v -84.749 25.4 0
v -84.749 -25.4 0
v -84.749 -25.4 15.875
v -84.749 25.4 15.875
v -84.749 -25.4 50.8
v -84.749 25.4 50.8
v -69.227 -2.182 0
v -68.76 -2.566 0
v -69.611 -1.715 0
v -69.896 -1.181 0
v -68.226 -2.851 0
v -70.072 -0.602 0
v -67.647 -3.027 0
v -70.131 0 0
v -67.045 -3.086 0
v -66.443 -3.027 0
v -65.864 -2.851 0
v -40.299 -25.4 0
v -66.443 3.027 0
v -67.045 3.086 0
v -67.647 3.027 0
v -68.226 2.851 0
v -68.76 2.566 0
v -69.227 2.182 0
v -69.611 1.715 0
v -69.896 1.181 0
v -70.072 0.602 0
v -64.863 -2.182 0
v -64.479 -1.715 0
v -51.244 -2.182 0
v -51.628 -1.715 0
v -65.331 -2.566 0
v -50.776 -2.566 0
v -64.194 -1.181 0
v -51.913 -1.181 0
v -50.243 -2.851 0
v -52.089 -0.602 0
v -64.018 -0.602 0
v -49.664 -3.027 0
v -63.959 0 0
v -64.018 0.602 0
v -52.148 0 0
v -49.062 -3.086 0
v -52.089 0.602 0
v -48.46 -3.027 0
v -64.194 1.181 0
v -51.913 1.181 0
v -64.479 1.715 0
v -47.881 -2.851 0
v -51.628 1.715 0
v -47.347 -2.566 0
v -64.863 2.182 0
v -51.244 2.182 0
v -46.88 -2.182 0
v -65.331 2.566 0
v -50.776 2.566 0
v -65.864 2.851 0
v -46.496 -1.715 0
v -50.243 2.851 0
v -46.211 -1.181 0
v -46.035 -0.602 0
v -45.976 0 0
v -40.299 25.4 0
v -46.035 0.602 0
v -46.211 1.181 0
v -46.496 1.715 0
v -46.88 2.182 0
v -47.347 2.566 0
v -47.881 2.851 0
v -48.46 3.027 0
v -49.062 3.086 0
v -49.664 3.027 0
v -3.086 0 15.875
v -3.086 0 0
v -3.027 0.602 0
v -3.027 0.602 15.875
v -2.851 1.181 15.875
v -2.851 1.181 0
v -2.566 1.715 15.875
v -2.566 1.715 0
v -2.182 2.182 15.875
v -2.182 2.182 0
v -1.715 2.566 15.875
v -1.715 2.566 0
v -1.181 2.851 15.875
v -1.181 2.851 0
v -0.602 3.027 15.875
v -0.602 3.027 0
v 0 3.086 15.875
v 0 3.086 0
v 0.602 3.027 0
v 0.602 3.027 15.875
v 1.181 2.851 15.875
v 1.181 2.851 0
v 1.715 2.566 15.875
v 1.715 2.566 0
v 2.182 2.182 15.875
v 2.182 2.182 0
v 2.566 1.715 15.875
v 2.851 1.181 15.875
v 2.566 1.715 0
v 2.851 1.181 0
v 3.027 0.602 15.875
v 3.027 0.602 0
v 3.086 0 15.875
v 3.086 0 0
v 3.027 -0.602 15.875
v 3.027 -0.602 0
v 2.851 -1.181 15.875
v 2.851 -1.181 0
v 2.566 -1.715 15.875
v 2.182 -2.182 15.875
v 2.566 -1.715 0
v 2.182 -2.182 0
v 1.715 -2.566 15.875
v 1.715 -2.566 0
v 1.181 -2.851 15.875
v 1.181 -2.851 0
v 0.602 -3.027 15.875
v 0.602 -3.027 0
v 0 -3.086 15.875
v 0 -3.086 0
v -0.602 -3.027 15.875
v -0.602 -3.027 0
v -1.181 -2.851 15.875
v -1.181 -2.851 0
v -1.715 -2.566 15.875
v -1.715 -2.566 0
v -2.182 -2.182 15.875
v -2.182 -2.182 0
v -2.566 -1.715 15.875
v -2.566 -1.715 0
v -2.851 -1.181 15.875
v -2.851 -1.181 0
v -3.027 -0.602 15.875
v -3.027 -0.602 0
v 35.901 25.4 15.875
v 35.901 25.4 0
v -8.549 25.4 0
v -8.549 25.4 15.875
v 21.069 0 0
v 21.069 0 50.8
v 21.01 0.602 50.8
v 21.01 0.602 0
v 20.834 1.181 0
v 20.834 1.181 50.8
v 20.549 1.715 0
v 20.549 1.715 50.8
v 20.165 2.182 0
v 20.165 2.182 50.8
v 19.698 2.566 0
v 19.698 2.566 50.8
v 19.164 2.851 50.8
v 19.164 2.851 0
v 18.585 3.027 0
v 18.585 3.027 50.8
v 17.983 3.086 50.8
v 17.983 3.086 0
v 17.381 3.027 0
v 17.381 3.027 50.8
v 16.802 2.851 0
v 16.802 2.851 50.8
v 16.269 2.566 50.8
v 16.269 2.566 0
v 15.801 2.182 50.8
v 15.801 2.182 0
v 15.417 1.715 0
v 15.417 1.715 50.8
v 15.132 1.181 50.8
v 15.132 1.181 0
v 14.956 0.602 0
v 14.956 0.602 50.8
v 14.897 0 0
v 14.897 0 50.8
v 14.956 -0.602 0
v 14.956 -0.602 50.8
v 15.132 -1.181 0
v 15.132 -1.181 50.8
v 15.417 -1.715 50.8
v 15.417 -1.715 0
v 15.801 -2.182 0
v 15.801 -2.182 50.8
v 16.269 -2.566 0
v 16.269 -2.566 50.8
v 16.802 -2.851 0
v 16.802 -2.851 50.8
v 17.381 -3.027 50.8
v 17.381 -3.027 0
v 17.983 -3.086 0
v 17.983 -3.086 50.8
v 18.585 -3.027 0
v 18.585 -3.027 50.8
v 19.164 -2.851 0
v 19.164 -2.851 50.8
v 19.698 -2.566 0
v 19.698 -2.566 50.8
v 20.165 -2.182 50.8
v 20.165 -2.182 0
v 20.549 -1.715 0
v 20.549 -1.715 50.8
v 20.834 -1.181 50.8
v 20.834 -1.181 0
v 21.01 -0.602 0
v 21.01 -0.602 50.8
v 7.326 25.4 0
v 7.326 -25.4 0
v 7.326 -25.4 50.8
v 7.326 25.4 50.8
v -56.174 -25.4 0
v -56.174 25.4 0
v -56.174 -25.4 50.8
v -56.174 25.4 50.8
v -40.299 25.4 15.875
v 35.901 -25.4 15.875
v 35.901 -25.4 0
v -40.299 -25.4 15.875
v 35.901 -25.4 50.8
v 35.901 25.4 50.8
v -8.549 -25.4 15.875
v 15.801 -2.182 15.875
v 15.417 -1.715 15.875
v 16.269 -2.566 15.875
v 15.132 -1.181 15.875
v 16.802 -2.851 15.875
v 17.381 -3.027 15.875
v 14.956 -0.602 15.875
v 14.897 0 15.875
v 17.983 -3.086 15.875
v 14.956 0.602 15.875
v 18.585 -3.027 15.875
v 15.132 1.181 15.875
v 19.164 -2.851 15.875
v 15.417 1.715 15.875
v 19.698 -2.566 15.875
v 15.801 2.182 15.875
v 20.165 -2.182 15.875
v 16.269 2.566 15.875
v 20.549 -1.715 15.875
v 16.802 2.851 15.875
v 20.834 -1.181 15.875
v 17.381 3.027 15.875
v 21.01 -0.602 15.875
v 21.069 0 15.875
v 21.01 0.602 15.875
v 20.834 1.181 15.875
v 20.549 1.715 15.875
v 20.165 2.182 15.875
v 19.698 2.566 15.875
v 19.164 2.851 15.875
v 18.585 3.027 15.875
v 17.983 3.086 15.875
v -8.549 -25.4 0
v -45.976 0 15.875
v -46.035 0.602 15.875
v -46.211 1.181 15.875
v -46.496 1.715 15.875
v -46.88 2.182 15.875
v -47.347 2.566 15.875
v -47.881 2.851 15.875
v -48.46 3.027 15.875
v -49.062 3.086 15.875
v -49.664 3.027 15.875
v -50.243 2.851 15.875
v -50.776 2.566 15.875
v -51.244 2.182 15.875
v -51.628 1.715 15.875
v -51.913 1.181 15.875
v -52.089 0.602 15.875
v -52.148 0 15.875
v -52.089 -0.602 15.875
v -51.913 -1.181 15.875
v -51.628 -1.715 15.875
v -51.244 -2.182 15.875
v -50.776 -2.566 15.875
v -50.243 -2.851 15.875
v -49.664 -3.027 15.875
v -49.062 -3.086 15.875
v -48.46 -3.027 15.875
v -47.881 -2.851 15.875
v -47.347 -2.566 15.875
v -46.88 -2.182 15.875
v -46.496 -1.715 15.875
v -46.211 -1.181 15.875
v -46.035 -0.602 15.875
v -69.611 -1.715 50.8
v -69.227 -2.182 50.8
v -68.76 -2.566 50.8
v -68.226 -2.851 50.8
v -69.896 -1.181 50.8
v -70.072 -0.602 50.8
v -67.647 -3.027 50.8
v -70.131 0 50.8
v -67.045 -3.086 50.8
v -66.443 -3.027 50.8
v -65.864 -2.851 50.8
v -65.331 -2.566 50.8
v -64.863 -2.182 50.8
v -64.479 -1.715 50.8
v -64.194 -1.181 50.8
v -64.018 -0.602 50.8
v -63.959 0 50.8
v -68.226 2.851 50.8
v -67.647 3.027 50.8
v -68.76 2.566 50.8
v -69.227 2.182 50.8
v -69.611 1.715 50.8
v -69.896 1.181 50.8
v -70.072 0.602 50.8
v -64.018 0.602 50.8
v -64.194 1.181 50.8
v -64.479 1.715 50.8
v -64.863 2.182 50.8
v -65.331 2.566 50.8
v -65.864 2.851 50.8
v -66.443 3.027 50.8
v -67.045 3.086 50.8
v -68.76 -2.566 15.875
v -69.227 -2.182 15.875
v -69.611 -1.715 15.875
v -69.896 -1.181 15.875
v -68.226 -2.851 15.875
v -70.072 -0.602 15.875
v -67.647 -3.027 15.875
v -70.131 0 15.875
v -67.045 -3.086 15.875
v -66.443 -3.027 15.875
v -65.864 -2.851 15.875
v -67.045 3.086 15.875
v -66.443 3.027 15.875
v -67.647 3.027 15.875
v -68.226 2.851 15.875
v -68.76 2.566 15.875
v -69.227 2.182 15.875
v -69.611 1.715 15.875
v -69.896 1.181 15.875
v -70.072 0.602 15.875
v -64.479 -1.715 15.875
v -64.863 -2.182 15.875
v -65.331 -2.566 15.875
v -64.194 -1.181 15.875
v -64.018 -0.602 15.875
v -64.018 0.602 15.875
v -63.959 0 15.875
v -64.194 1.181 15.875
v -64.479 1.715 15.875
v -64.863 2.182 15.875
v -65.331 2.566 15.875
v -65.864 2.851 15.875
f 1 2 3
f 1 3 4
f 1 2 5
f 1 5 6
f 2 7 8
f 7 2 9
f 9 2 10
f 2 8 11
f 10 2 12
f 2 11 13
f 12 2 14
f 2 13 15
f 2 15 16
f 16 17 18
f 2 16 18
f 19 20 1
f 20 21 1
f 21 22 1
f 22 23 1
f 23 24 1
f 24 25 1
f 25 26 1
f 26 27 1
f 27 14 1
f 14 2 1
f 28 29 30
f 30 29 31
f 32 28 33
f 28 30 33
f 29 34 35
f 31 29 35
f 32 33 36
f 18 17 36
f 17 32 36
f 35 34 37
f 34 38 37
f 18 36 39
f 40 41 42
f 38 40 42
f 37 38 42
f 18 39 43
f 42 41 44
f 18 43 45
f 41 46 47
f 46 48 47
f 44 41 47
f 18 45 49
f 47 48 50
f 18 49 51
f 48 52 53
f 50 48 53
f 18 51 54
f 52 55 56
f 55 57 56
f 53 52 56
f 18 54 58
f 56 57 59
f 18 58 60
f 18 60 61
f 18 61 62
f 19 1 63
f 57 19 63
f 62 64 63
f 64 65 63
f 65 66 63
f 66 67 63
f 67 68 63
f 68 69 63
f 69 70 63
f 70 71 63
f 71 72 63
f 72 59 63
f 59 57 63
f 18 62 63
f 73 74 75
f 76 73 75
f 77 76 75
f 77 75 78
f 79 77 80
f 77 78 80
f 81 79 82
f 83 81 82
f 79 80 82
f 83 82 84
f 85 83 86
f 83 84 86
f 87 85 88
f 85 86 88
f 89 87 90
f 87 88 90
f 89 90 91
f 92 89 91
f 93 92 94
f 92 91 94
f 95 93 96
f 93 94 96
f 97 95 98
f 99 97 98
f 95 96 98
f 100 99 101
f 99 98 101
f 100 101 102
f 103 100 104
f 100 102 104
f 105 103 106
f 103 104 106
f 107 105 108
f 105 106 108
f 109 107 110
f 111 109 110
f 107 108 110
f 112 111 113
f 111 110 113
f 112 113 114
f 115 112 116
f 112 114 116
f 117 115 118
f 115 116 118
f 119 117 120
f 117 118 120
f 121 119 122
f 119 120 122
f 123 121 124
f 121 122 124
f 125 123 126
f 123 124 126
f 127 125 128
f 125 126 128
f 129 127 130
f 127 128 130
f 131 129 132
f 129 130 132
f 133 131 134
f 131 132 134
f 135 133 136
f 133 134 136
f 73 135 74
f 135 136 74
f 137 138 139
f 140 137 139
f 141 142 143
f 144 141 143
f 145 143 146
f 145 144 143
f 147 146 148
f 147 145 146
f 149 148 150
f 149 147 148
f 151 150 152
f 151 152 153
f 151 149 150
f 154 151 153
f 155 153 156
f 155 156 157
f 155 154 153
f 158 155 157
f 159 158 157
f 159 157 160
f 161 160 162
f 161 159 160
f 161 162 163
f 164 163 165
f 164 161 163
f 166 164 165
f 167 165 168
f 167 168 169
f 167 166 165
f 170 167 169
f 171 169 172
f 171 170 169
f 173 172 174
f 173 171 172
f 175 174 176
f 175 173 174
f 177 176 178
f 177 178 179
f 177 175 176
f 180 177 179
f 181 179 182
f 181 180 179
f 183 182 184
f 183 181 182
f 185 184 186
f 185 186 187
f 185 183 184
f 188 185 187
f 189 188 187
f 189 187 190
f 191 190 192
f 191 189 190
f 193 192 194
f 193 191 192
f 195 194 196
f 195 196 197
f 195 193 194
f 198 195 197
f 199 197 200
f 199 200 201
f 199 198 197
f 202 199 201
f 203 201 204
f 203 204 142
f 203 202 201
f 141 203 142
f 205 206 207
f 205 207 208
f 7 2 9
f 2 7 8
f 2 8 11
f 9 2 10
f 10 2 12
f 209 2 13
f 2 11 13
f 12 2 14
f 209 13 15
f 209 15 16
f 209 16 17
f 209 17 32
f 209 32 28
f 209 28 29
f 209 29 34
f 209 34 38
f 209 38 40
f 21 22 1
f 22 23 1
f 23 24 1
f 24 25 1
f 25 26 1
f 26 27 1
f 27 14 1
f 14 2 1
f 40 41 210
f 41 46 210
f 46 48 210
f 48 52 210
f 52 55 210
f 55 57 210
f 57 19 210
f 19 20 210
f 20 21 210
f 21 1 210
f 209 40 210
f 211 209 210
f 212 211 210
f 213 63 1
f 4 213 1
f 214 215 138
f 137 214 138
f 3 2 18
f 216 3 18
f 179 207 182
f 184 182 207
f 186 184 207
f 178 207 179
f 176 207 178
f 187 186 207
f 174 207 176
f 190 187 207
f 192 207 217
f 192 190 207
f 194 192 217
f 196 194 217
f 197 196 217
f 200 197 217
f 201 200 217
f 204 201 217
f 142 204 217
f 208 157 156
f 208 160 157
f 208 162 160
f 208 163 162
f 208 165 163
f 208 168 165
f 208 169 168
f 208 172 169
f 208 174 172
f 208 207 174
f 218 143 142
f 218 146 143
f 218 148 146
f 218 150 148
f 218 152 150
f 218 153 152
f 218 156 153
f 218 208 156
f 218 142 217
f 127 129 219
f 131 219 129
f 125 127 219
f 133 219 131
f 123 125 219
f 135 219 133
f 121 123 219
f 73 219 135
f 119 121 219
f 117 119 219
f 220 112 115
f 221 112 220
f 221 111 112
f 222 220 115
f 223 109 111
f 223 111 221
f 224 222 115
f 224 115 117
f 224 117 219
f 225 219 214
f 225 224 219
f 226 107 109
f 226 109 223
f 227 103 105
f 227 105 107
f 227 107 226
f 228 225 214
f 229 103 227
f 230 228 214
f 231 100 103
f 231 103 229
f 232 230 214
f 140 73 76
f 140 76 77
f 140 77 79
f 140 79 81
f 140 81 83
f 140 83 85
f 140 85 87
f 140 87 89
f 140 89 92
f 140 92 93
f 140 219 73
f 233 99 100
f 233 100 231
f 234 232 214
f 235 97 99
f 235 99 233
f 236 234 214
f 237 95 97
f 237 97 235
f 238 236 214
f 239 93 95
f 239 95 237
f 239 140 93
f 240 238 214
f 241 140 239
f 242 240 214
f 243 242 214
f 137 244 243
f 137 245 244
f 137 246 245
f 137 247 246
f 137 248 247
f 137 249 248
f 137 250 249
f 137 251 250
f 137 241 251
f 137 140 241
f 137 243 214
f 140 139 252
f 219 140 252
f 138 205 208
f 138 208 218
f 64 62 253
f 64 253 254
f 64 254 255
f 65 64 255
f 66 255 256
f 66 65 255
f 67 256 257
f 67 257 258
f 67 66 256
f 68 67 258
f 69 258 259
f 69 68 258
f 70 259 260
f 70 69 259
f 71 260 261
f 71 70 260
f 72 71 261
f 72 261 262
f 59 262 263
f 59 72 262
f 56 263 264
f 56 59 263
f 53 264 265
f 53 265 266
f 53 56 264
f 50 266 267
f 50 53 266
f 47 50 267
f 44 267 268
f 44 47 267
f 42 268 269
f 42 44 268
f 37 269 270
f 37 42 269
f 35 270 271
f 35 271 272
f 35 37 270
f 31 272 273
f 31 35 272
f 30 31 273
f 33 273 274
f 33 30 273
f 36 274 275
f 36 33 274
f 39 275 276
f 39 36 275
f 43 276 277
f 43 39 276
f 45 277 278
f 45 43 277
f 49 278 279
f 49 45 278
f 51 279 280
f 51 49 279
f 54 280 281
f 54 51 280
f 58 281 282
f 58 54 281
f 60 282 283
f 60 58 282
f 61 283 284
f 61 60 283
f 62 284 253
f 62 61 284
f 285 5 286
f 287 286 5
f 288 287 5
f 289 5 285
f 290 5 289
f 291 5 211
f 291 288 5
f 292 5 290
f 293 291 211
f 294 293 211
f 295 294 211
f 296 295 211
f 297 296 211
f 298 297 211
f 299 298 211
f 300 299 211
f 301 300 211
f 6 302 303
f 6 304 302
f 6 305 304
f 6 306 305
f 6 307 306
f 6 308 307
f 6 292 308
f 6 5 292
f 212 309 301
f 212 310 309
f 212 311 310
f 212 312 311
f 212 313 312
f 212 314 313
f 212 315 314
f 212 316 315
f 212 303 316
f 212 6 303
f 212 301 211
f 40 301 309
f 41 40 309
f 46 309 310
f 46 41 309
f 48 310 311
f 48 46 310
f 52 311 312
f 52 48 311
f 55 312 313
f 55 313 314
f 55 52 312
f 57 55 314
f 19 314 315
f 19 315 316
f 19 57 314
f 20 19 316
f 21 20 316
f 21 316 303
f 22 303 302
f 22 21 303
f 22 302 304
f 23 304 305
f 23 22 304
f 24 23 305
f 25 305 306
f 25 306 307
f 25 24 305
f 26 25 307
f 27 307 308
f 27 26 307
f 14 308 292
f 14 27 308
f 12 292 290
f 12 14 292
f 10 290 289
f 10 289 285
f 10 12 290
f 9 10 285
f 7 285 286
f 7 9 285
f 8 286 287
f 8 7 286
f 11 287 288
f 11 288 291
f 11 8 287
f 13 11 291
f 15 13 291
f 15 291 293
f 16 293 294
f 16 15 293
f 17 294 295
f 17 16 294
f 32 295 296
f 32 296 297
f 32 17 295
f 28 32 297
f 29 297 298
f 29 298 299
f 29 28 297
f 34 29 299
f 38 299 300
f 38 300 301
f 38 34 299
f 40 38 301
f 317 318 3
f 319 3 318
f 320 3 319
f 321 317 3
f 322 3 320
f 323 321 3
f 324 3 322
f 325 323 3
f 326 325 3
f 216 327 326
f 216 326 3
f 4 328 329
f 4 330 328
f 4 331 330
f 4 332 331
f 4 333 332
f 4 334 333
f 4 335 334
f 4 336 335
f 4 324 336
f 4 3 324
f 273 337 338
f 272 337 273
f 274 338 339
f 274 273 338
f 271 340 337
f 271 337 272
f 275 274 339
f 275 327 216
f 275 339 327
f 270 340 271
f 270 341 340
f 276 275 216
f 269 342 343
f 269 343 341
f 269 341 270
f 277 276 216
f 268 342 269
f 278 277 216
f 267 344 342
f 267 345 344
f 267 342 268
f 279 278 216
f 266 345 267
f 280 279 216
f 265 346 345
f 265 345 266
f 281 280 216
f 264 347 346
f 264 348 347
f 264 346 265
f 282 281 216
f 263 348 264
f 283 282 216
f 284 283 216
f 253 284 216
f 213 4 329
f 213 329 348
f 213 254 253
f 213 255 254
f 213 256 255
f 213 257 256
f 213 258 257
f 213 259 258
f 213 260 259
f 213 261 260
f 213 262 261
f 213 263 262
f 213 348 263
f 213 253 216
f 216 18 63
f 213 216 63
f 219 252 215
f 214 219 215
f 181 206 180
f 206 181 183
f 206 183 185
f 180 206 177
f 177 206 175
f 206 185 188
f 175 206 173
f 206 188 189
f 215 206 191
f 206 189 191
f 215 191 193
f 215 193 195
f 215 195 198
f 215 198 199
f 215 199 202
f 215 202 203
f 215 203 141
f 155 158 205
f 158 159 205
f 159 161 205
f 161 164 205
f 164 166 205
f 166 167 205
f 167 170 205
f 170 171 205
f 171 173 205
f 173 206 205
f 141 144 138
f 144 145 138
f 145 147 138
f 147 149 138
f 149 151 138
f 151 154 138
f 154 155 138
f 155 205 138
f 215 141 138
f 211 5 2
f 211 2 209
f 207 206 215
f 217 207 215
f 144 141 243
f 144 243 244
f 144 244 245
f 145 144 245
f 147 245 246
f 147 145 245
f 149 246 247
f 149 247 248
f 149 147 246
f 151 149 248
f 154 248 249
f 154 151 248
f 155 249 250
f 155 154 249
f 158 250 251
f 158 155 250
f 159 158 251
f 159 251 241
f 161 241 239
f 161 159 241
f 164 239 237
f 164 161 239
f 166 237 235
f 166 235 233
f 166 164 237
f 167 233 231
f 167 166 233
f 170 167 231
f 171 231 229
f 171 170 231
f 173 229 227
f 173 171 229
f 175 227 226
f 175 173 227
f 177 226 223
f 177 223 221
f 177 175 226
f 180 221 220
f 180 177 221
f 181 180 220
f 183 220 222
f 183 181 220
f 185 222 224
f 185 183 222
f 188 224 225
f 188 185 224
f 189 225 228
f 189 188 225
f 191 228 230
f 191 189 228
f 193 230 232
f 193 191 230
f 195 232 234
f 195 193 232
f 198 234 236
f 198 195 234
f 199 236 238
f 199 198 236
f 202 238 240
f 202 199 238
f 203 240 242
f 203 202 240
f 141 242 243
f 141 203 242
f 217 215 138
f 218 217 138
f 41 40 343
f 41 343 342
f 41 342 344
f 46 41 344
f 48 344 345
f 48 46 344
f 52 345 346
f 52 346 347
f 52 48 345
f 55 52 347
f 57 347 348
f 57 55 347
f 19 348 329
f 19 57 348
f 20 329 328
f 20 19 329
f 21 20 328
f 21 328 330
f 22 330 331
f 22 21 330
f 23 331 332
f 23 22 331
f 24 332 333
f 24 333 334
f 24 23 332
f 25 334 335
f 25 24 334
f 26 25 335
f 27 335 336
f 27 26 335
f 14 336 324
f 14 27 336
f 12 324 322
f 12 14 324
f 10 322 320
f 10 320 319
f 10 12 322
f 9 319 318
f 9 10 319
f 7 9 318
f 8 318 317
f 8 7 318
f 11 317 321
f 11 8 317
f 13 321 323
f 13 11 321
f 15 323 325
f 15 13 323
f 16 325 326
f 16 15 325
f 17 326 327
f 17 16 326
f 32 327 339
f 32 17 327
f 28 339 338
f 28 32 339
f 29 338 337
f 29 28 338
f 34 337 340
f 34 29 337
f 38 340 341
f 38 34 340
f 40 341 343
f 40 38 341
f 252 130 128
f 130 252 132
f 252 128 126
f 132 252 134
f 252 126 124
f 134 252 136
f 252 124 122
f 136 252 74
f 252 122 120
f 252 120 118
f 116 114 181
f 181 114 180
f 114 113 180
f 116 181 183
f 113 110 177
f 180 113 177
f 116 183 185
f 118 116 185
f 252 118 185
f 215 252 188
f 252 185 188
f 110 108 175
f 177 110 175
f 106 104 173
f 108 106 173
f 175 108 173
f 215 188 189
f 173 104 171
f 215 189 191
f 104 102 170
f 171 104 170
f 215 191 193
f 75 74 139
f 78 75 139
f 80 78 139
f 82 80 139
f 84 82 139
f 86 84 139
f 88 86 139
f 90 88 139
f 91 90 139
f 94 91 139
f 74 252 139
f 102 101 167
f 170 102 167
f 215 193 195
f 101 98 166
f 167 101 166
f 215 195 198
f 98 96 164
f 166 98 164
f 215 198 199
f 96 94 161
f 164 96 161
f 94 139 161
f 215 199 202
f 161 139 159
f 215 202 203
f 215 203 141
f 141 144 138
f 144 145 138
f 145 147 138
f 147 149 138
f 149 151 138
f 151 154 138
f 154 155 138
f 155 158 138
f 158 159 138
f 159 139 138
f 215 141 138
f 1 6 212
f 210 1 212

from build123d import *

# Parameters (mm, degrees)
F0_W     = 28.575
F0_H     = 50.8
F0_R     = 3.0861
F1_DEPTH = 50.8
F2_DEPTH = 15.875


with BuildPart() as f1:
    # F0 (on Top) → F1 (new body)
    with BuildSketch(Plane.XY):
        with Locations((-70.4613795156, 0)):
            Rectangle(F0_W, F0_H)
        with Locations((-67.0450795156, 0)):
            Circle(F0_R, mode=Mode.SUBTRACT)
    extrude(amount=F1_DEPTH)


with BuildPart() as f1b:
    # F0 (on Top) → F1, piece 2 (new body)
    with BuildSketch(Plane.XY):
        with Locations((21.6136204844, 0)):
            Rectangle(F0_W, F0_H)
        with Locations((17.9832, 0)):
            Circle(F0_R, mode=Mode.SUBTRACT)
    extrude(amount=F1_DEPTH)


with BuildPart() as f2:
    # F0 (on Top) → F2 (new body)
    with BuildSketch(Plane.XY):
        Polygon((-40.2988795156, -25.4), (-40.2988795156, 0), (-40.2988795156, 25.4), (-56.1738795156, 25.4), (-56.1738795156, -25.4), align=None)
        with Locations((-49.0618795156, 0)):
            Circle(F0_R, mode=Mode.SUBTRACT)
        with Locations((-70.4613795156, 0)):
            Rectangle(F0_W, F0_H)
        with Locations((-67.0450795156, 0)):
            Circle(F0_R, mode=Mode.SUBTRACT)
    extrude(amount=F2_DEPTH)


with BuildPart() as f2b:
    # F0 (on Top) → F2, piece 2 (new body)
    with BuildSketch(Plane.XY):
        Polygon((-8.5488795156, 25.4), (-8.5488795156, 0), (-8.5488795156, -25.4), (7.3261204844, -25.4), (7.3261204844, 25.4), align=None)
        with BuildLine():
            ThreePointArc((3.0861, 0), (0, -3.0861), (-3.0861, 0))
            ThreePointArc((-3.0861, 0), (0, 3.0861), (3.0861, 0))
        make_face(mode=Mode.SUBTRACT)
        with Locations((21.6136204844, 0)):
            Rectangle(F0_W, F0_H)
        with Locations((17.9832, 0)):
            Circle(F0_R, mode=Mode.SUBTRACT)
    extrude(amount=F2_DEPTH)


solid = Compound([f1.part, f1b.part, f2.part, f2b.part])
